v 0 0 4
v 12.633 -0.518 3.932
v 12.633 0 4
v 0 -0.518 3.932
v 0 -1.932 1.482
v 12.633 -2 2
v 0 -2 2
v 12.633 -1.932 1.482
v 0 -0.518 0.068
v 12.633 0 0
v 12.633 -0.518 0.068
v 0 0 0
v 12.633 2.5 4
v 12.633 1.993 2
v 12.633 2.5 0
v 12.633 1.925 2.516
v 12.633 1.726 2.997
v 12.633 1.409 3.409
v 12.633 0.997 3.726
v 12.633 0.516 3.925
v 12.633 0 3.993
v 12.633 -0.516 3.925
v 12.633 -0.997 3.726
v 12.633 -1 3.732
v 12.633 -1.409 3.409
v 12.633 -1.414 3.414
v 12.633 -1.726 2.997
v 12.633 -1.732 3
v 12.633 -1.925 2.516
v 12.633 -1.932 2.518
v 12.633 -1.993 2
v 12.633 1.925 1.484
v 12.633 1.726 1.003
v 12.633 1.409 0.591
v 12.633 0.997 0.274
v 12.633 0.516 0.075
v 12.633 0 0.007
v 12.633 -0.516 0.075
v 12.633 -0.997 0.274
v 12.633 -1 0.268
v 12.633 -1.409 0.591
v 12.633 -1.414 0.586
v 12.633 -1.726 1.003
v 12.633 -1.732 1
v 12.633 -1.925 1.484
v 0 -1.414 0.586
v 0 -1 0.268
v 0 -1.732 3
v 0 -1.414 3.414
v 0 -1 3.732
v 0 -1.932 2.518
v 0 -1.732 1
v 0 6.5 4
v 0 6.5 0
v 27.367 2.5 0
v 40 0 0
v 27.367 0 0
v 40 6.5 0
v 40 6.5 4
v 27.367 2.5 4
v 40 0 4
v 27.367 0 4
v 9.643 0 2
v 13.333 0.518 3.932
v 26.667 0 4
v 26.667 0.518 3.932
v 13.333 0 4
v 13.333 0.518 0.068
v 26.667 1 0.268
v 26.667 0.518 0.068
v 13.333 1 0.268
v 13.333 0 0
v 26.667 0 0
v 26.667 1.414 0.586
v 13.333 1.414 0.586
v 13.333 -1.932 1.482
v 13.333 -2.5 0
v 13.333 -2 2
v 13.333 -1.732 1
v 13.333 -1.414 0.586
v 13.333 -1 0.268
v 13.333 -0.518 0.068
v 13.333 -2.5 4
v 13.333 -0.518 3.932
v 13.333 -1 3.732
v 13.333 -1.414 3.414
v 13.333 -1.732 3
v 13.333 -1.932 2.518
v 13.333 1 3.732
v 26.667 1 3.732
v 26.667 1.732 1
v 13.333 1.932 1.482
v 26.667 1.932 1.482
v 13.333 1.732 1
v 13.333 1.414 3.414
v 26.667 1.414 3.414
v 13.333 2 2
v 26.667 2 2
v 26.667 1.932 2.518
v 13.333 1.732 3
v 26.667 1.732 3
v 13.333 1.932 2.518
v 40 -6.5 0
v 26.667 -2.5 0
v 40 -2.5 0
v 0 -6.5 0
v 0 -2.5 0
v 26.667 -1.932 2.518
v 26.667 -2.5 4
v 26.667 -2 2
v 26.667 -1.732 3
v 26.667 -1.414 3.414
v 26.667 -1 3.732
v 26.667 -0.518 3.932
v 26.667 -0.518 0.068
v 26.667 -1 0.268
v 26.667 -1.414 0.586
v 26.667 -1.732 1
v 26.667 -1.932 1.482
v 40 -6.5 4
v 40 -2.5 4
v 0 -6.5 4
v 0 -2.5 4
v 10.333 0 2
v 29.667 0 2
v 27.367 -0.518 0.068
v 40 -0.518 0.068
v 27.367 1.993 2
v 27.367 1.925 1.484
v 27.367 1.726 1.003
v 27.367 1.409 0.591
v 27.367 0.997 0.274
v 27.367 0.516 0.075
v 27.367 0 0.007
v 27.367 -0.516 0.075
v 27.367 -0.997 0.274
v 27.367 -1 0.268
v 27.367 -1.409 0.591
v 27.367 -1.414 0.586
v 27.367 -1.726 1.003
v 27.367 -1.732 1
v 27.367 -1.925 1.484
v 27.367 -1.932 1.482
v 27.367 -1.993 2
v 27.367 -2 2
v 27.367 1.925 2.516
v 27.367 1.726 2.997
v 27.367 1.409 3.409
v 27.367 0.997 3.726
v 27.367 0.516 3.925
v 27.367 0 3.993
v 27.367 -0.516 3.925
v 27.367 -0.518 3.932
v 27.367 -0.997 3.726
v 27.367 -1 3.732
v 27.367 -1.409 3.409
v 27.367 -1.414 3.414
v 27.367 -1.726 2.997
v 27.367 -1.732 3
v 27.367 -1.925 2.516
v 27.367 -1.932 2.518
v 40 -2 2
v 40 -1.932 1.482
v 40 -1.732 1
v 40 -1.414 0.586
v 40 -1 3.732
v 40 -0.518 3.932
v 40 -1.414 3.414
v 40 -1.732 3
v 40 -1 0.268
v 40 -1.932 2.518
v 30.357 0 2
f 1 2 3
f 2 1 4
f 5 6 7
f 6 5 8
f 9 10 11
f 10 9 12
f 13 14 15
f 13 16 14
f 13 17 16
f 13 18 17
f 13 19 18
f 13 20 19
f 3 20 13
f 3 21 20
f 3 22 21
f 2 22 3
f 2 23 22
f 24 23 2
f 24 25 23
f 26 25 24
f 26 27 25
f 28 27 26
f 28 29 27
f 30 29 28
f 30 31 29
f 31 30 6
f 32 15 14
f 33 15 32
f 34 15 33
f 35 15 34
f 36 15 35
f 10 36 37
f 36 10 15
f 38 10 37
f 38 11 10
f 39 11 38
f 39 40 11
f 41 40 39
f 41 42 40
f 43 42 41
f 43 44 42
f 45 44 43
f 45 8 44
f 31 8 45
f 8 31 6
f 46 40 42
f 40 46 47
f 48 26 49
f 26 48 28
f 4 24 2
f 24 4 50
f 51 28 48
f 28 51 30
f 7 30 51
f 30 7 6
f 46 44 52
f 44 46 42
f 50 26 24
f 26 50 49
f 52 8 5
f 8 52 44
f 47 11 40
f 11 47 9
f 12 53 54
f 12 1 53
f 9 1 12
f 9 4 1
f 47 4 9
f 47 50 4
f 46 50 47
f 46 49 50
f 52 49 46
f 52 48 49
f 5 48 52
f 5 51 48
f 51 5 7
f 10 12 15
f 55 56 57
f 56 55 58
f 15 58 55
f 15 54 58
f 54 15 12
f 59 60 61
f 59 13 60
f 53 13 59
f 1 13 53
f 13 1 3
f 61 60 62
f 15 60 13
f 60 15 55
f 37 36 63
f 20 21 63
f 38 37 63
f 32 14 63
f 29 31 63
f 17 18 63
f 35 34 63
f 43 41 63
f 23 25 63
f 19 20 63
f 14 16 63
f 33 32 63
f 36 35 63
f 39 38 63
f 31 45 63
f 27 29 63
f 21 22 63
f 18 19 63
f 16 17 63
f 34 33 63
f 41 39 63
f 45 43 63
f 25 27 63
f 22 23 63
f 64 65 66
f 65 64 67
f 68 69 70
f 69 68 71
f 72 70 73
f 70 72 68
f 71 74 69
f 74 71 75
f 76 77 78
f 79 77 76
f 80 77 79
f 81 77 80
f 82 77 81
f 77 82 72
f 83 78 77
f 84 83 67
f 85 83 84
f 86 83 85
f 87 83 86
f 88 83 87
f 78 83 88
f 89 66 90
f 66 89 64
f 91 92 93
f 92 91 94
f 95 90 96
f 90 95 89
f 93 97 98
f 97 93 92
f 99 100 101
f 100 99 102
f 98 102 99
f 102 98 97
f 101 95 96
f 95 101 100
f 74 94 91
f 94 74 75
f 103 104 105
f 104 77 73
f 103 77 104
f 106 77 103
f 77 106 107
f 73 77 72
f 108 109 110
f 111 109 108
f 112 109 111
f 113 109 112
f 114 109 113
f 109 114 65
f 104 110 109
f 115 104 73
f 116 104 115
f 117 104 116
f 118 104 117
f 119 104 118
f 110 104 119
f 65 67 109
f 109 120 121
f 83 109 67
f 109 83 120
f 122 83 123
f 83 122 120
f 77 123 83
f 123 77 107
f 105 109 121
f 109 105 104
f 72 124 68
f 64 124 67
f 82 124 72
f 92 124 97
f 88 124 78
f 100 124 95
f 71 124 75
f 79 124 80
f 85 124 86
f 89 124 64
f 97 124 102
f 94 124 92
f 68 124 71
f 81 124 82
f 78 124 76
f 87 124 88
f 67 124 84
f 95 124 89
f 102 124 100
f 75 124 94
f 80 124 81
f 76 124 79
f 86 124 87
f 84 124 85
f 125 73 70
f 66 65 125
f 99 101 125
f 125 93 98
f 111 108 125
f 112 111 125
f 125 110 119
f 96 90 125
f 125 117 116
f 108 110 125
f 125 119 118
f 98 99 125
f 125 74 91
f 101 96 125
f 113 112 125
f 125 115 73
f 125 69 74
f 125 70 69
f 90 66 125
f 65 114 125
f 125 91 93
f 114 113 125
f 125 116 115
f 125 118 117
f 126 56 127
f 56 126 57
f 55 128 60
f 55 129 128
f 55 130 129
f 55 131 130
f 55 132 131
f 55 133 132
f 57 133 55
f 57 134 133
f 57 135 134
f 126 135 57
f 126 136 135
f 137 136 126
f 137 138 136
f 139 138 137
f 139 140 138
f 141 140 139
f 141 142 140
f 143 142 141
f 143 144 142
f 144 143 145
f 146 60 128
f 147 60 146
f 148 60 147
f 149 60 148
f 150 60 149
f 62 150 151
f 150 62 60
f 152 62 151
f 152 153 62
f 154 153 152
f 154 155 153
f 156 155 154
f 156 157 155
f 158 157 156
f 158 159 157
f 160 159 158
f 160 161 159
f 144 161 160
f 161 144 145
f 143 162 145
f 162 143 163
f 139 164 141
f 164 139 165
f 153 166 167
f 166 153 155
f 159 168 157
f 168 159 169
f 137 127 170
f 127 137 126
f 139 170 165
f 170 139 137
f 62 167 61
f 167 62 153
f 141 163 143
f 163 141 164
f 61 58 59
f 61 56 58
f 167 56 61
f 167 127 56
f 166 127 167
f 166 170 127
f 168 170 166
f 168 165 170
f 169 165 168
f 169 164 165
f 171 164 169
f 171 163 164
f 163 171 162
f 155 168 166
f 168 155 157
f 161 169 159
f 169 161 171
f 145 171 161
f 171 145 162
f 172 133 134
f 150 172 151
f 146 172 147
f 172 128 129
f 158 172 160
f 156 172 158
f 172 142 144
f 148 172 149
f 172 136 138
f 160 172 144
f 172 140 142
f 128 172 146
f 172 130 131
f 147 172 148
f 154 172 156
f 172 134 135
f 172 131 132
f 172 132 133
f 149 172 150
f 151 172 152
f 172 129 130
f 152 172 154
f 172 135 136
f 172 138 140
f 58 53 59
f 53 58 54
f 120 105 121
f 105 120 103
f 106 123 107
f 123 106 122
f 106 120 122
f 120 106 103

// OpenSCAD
// mathgrrl cone hinge

//////////////////////////////////////////////////////
// parameters

// Length of the complete hinge
length = 40;

// Height (diameter) of the hinge
height = 4;

// Clearance between cones and holes
clearance = .7;		

// Clearance between hinge and sides
gap = .5; 				

// Parameters that the user does not get to specify
$fn=24*1;
border = 2*1; 
fudge = .01*1;			// to preserve mesh integrity
corner = 0*1;      	// space between hinge and corner
hinge_radius = height/2;
cone_height = 1.5*hinge_radius;  

//////////////////////////////////////////////////////
// renders

rotate(90,[0,1,0]) 
	translate([-hinge_radius,0,0])
		hinge();

translate([0,hinge_radius+gap,0]) bar();
translate([0,-2*border-hinge_radius-gap,0]) bar();

//translate([0,hinge_radius+gap,0]) square();
//translate([0,-length-hinge_radius-gap,0]) square();


//////////////////////////////////////////////////////
// module for hinge

module hinge(){
	rad = hinge_radius;
	clr = clearance;
	len = (length-2*corner)/3; 
	con = cone_height;
	// left outside hinge = (cylinder+box)-cone
	difference(){
		union(){
			translate([0,0,corner]) cylinder(h=len-clr,r=rad);
			translate([-rad,0,corner]) cube([2*rad,rad+gap,len-clr]);
		}
		translate([0,0,corner+len-con-clr+fudge]) cylinder(h=con,r1=0,r2=rad);
	}
	// inside hinge = cylinder+box+cone+cone
	union(){
		translate([0,0,corner+len]) cylinder(h=len,r=rad);
		translate([-rad,-rad-gap,corner+len]) cube([2*rad,rad+gap,len]);
		translate([0,0,corner+len-con]) cylinder(h=con,r1=0,r2=rad);
		translate([0,0,corner+2*len]) cylinder(h=con,r1=rad,r2=0);
	}
	// right outside hinge = (cylinder+box)-cone
	difference(){
		union(){
			translate([0,0,corner+2*len+clr]) cylinder(h=len-clr,r=rad);
			translate([-rad,0,corner+2*len+clr]) cube([2*rad,rad+gap,len-clr]);
		}
		translate([0,0,corner+2*len+clr-fudge]) cylinder(h=con,r1=rad,r2=0);	
	}
}

//////////////////////////////////////////////////////
// module for square shape

module square(){
	difference(){
		cube([length,length,height]);
		translate([border,border,-fudge])
			cube(	[length-2*border,length-2*border,height+2*fudge]);
	}
}

//////////////////////////////////////////////////////
// module for bar shape

module bar(){
	cube([length,2*border,height]);
}
